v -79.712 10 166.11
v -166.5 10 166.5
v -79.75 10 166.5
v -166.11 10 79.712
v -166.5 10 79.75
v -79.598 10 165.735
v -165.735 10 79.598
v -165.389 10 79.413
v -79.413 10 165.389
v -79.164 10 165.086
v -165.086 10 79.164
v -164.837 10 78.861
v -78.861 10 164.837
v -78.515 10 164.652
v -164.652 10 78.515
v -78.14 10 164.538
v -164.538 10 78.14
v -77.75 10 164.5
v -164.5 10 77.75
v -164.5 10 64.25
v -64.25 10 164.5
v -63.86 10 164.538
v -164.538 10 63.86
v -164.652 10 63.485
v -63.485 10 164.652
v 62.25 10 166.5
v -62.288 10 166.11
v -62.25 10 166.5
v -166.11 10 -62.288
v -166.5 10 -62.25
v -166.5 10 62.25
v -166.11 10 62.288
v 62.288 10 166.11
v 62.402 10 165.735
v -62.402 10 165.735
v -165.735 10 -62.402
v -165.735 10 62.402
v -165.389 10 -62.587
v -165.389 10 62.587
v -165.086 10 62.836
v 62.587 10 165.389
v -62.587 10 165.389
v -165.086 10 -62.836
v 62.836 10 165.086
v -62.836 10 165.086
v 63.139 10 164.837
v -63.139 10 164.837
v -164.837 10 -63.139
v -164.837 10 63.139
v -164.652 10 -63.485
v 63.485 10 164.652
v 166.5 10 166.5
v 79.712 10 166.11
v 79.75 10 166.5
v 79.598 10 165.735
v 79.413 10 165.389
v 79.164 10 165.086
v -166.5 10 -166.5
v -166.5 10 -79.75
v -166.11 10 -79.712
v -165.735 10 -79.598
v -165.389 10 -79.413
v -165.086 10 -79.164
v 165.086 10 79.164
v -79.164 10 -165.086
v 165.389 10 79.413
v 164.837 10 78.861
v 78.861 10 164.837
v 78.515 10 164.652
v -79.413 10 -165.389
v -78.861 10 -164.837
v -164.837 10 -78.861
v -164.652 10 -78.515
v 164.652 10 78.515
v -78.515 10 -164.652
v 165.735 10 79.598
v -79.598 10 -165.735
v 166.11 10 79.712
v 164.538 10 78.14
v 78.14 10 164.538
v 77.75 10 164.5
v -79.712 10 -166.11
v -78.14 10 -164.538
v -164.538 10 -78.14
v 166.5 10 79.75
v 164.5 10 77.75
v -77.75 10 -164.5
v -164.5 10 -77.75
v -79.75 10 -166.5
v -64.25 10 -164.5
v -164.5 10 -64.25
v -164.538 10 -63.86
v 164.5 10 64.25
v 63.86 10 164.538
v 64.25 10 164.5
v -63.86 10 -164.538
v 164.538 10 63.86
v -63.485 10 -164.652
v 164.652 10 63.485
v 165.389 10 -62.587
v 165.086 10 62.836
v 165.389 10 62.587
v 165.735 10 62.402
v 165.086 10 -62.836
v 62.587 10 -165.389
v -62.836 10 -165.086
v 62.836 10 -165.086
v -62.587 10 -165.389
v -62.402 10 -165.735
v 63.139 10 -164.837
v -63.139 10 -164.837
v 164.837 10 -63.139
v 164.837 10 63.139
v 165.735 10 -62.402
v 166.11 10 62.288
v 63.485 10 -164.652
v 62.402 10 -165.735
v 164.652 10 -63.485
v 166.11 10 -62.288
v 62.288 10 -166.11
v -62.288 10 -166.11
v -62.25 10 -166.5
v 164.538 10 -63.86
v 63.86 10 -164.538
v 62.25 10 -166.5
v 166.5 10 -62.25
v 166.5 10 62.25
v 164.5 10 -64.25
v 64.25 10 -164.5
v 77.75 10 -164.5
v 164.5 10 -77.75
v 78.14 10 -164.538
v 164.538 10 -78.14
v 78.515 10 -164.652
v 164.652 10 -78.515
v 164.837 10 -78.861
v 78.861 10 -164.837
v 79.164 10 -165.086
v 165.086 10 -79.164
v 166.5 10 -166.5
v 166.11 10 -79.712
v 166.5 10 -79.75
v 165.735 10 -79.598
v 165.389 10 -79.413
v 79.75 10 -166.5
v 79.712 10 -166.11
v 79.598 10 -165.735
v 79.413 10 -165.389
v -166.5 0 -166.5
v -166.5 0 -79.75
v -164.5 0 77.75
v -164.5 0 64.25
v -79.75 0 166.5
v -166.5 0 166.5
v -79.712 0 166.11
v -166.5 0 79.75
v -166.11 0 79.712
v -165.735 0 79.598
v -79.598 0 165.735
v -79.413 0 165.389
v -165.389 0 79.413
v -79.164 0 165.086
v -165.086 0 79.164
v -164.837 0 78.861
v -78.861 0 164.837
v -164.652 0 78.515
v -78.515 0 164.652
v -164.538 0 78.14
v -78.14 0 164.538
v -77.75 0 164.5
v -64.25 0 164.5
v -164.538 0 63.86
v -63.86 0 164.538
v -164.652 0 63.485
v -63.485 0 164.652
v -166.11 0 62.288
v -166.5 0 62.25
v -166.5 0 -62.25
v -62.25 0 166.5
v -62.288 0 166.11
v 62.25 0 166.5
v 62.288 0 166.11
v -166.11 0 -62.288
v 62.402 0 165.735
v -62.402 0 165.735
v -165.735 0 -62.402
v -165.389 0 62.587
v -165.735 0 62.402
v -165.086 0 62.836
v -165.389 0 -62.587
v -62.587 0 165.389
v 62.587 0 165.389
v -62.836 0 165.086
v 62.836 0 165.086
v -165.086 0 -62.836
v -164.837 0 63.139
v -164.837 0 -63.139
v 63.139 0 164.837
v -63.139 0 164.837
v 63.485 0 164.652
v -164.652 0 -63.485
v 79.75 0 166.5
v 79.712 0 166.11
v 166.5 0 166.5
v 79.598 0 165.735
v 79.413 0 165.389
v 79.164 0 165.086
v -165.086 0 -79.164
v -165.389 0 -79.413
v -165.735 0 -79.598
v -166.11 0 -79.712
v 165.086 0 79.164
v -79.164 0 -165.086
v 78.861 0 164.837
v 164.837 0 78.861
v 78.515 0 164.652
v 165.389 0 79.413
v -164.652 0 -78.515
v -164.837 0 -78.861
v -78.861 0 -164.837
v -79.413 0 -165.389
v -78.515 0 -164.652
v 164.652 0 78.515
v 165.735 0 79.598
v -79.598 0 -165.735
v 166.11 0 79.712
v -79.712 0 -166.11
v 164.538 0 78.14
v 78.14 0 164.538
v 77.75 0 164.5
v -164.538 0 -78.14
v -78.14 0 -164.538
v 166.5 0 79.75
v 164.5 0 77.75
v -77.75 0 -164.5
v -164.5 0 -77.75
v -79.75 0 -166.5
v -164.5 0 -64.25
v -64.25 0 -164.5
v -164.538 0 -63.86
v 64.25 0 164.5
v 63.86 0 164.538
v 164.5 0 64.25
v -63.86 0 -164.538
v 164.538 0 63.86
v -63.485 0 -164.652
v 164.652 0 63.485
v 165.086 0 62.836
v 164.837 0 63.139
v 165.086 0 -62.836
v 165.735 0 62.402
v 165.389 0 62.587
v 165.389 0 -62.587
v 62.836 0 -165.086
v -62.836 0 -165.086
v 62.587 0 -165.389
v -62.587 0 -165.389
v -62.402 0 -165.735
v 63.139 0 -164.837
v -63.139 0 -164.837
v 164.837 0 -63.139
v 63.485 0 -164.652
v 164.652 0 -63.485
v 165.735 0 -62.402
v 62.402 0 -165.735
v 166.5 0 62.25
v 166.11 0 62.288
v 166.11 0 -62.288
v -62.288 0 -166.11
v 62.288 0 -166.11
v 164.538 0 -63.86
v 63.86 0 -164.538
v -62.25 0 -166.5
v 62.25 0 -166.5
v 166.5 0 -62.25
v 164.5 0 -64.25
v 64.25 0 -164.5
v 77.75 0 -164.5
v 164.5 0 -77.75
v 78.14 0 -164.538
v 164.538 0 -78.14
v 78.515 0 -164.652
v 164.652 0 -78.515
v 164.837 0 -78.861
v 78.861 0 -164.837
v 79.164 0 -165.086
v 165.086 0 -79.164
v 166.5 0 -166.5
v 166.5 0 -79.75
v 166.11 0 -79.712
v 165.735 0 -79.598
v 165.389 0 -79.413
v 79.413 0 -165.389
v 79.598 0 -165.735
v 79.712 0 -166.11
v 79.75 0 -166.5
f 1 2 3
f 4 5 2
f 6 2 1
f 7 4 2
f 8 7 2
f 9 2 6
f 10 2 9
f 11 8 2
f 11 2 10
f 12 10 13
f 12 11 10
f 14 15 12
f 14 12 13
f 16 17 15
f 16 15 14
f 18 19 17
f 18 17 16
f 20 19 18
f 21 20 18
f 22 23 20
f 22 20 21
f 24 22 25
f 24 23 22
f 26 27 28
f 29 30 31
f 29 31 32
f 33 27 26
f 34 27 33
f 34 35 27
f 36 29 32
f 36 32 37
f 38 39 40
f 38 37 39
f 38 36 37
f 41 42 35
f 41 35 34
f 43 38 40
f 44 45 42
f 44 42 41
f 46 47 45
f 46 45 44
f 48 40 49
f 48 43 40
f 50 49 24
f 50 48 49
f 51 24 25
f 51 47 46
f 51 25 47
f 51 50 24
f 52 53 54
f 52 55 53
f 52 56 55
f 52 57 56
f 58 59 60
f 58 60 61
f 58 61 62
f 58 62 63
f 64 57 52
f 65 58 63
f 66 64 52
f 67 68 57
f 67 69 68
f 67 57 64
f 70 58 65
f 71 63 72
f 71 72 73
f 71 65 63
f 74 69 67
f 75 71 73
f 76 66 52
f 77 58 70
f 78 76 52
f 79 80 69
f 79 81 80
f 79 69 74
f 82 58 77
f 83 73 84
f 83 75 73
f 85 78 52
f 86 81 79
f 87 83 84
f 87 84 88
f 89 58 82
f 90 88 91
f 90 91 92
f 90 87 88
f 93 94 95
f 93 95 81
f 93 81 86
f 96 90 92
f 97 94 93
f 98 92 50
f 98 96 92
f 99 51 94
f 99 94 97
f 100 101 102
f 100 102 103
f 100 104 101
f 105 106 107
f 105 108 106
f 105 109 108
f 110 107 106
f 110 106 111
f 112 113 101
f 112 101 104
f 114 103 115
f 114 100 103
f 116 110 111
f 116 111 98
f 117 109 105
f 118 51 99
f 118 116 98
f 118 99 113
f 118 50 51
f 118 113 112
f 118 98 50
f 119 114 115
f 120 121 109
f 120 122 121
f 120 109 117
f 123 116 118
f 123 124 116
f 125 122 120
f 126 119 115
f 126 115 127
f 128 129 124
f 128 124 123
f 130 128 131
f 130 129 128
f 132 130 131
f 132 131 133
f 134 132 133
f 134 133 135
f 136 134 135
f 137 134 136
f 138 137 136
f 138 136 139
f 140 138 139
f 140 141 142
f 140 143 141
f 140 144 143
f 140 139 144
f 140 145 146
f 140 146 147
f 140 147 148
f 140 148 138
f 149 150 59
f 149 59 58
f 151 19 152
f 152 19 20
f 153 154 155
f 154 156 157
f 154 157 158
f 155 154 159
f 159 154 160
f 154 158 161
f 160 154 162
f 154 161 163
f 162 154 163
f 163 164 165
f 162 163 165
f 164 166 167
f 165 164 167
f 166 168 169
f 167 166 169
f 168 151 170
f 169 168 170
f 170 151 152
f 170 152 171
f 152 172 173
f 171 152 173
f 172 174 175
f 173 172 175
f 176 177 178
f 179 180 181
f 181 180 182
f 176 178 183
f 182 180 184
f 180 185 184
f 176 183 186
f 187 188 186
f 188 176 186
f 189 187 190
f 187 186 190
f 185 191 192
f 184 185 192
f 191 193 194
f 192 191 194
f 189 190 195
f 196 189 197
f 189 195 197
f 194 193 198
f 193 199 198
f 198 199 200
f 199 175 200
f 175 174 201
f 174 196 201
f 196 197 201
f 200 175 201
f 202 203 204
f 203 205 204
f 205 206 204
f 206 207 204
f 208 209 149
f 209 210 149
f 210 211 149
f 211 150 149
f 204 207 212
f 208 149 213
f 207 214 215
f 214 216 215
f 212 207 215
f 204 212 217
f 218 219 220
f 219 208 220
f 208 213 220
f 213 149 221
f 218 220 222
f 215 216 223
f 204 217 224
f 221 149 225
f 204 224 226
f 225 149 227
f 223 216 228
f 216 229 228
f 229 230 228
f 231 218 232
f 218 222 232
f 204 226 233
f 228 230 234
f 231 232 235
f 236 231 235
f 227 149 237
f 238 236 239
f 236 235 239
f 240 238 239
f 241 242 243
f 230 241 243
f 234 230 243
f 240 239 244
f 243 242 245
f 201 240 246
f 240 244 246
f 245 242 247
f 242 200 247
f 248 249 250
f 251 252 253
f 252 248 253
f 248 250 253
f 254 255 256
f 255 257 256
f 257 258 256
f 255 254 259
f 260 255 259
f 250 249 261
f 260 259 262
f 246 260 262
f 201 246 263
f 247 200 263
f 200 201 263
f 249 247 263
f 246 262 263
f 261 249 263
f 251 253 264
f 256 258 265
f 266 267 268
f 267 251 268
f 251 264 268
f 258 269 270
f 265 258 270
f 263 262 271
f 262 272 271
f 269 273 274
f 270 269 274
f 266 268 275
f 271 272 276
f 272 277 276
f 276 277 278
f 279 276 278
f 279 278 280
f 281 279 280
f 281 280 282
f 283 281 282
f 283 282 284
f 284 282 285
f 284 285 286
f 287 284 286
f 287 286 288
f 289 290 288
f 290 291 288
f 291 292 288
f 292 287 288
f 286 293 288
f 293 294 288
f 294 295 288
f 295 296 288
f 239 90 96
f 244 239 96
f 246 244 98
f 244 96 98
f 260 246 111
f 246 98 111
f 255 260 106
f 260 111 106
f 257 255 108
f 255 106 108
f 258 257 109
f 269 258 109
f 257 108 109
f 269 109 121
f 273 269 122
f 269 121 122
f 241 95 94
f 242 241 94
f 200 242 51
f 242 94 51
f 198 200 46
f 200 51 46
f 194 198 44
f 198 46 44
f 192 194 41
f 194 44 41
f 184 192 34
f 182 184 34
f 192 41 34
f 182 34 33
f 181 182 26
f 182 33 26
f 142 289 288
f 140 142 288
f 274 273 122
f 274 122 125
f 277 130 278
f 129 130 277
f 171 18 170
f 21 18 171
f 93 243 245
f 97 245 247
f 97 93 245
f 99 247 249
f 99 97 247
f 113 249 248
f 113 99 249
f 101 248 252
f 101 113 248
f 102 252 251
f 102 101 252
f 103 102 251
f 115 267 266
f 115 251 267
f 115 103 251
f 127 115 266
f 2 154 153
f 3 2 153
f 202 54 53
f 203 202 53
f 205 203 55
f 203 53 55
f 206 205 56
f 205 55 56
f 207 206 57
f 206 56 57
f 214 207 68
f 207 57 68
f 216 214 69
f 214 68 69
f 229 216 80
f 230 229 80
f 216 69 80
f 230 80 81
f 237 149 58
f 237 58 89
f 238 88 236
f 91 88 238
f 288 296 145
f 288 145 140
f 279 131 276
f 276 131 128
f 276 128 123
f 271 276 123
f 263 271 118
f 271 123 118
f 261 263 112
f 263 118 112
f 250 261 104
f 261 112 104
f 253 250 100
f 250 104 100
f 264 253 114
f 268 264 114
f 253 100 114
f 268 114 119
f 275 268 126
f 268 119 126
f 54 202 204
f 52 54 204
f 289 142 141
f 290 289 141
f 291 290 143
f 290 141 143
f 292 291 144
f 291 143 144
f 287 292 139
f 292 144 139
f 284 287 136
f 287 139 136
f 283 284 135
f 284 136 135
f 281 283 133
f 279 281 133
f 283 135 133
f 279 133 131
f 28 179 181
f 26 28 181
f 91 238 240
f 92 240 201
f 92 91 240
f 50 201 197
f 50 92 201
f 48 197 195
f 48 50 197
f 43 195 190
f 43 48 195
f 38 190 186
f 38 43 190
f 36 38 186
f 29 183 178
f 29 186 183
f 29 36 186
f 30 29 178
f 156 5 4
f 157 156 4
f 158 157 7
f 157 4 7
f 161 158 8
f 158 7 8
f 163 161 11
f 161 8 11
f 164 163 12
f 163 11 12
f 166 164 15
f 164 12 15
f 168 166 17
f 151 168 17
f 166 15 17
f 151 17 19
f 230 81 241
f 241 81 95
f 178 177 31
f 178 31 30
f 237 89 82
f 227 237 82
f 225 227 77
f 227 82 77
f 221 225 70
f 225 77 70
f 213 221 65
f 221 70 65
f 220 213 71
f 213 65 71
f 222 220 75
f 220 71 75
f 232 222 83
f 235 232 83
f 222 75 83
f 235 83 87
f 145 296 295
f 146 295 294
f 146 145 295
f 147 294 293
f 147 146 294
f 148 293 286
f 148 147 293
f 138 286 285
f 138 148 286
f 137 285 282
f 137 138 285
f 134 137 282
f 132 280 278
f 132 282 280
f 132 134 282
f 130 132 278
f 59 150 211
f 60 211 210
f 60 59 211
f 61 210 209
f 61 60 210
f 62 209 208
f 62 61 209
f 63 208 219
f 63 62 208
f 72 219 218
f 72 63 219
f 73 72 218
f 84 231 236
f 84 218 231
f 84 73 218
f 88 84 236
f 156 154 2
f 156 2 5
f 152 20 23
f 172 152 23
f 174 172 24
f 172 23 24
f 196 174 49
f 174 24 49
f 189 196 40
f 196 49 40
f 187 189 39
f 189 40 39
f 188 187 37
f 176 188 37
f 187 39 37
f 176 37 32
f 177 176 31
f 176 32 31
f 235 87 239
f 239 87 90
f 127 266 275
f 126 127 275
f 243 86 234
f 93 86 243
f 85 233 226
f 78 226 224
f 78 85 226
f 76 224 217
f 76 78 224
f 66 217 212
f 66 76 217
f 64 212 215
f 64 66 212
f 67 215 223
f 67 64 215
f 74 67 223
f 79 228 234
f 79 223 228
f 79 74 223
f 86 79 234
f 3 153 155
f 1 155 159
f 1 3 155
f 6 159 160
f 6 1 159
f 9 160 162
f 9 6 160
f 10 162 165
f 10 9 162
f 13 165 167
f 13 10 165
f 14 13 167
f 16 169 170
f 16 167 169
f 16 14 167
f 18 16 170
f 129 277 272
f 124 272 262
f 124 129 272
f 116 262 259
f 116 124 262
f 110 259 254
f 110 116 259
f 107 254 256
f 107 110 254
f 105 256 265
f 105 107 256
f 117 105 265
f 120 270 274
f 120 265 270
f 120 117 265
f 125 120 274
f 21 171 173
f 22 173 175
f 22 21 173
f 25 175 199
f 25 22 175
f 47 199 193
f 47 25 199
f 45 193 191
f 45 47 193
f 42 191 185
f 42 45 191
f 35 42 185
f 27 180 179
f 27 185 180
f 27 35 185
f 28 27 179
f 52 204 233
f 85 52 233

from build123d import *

# Parameters (mm, degrees)
SKETCH1_W           = 333
SKETCH1_H           = 333
BOSS_EXTRUDE1_DEPTH = 10
CUT_EXTRUDE1_DEPTH  = 11


with BuildPart() as part:
    # Sketch1 → Boss-Extrude1 (new body)
    with BuildSketch(Plane(origin=(0, 0, 0), x_dir=(1, 0, 0), z_dir=(0, 1, 0))):
        Rectangle(SKETCH1_W, SKETCH1_H)
    extrude(amount=BOSS_EXTRUDE1_DEPTH)

    # Sketch2 → Cut-Extrude1 (cut, through all)
    with BuildSketch(Plane(origin=(0, 10, 0), x_dir=(1, 0, 0), z_dir=(0, 1, 0))):
        with BuildLine():
            Line((-77.75, -164.5), (-64.25, -164.5))
            ThreePointArc((-64.25, -164.5), (-62.835786438, -165.085786438), (-62.25, -166.5))
            Line((-62.25, -166.5), (-62.25, -168.5))
            Line((-62.25, -168.5), (-79.75, -168.5))
            Line((-79.75, -168.5), (-79.75, -166.5))
            ThreePointArc((-79.75, -166.5), (-79.164213562, -165.085786438), (-77.75, -164.5))
        make_face()
        with BuildLine():
            Line((166.5, -62.25), (168.5, -62.25))
            Line((168.5, -62.25), (168.5, -79.75))
            Line((168.5, -79.75), (166.5, -79.75))
            ThreePointArc((166.5, -79.75), (165.085786438, -79.164213562), (164.5, -77.75))
            Line((164.5, -77.75), (164.5, -64.25))
            ThreePointArc((164.5, -64.25), (165.085786438, -62.835786438), (166.5, -62.25))
        make_face()
        with BuildLine():
            Line((62.25, -166.5), (62.25, -168.5))
            Line((62.25, -168.5), (79.75, -168.5))
            Line((79.75, -168.5), (79.75, -166.5))
            ThreePointArc((79.75, -166.5), (79.164213562, -165.085786438), (77.75, -164.5))
            Line((77.75, -164.5), (64.25, -164.5))
            ThreePointArc((64.25, -164.5), (62.835786438, -165.085786438), (62.25, -166.5))
        make_face()
        with BuildLine():
            Line((168.5, 62.25), (168.5, 79.75))
            Line((168.5, 79.75), (166.5, 79.75))
            ThreePointArc((166.5, 79.75), (165.085786438, 79.164213562), (164.5, 77.75))
            Line((164.5, 77.75), (164.5, 64.25))
            ThreePointArc((164.5, 64.25), (165.085786438, 62.835786438), (166.5, 62.25))
            Line((166.5, 62.25), (168.5, 62.25))
        make_face()
        with BuildLine():
            Line((-166.5, 62.25), (-168.5, 62.25))
            Line((-168.5, 62.25), (-168.5, 79.75))
            Line((-168.5, 79.75), (-166.5, 79.75))
            ThreePointArc((-166.5, 79.75), (-165.085786438, 79.164213562), (-164.5, 77.75))
            Line((-164.5, 77.75), (-164.5, 64.25))
            ThreePointArc((-164.5, 64.25), (-165.085786438, 62.835786438), (-166.5, 62.25))
        make_face()
        with BuildLine():
            Line((-168.5, -62.25), (-168.5, -79.75))
            Line((-168.5, -79.75), (-166.5, -79.75))
            ThreePointArc((-166.5, -79.75), (-165.085786438, -79.164213562), (-164.5, -77.75))
            Line((-164.5, -77.75), (-164.5, -64.25))
            ThreePointArc((-164.5, -64.25), (-165.085786438, -62.835786438), (-166.5, -62.25))
            Line((-166.5, -62.25), (-168.5, -62.25))
        make_face()
        with BuildLine():
            Line((77.75, 164.5), (64.25, 164.5))
            ThreePointArc((64.25, 164.5), (62.835786438, 165.085786438), (62.25, 166.5))
            Line((62.25, 166.5), (62.25, 168.5))
            Line((62.25, 168.5), (79.75, 168.5))
            Line((79.75, 168.5), (79.75, 166.5))
            ThreePointArc((79.75, 166.5), (79.164213562, 165.085786438), (77.75, 164.5))
        make_face()
        with BuildLine():
            Line((-62.25, 166.5), (-62.25, 168.5))
            Line((-62.25, 168.5), (-79.75, 168.5))
            Line((-79.75, 168.5), (-79.75, 166.5))
            ThreePointArc((-79.75, 166.5), (-79.164213562, 165.085786438), (-77.75, 164.5))
            Line((-77.75, 164.5), (-64.25, 164.5))
            ThreePointArc((-64.25, 164.5), (-62.835786438, 165.085786438), (-62.25, 166.5))
        make_face()
    extrude(amount=-CUT_EXTRUDE1_DEPTH, mode=Mode.SUBTRACT)


solid = part.part
